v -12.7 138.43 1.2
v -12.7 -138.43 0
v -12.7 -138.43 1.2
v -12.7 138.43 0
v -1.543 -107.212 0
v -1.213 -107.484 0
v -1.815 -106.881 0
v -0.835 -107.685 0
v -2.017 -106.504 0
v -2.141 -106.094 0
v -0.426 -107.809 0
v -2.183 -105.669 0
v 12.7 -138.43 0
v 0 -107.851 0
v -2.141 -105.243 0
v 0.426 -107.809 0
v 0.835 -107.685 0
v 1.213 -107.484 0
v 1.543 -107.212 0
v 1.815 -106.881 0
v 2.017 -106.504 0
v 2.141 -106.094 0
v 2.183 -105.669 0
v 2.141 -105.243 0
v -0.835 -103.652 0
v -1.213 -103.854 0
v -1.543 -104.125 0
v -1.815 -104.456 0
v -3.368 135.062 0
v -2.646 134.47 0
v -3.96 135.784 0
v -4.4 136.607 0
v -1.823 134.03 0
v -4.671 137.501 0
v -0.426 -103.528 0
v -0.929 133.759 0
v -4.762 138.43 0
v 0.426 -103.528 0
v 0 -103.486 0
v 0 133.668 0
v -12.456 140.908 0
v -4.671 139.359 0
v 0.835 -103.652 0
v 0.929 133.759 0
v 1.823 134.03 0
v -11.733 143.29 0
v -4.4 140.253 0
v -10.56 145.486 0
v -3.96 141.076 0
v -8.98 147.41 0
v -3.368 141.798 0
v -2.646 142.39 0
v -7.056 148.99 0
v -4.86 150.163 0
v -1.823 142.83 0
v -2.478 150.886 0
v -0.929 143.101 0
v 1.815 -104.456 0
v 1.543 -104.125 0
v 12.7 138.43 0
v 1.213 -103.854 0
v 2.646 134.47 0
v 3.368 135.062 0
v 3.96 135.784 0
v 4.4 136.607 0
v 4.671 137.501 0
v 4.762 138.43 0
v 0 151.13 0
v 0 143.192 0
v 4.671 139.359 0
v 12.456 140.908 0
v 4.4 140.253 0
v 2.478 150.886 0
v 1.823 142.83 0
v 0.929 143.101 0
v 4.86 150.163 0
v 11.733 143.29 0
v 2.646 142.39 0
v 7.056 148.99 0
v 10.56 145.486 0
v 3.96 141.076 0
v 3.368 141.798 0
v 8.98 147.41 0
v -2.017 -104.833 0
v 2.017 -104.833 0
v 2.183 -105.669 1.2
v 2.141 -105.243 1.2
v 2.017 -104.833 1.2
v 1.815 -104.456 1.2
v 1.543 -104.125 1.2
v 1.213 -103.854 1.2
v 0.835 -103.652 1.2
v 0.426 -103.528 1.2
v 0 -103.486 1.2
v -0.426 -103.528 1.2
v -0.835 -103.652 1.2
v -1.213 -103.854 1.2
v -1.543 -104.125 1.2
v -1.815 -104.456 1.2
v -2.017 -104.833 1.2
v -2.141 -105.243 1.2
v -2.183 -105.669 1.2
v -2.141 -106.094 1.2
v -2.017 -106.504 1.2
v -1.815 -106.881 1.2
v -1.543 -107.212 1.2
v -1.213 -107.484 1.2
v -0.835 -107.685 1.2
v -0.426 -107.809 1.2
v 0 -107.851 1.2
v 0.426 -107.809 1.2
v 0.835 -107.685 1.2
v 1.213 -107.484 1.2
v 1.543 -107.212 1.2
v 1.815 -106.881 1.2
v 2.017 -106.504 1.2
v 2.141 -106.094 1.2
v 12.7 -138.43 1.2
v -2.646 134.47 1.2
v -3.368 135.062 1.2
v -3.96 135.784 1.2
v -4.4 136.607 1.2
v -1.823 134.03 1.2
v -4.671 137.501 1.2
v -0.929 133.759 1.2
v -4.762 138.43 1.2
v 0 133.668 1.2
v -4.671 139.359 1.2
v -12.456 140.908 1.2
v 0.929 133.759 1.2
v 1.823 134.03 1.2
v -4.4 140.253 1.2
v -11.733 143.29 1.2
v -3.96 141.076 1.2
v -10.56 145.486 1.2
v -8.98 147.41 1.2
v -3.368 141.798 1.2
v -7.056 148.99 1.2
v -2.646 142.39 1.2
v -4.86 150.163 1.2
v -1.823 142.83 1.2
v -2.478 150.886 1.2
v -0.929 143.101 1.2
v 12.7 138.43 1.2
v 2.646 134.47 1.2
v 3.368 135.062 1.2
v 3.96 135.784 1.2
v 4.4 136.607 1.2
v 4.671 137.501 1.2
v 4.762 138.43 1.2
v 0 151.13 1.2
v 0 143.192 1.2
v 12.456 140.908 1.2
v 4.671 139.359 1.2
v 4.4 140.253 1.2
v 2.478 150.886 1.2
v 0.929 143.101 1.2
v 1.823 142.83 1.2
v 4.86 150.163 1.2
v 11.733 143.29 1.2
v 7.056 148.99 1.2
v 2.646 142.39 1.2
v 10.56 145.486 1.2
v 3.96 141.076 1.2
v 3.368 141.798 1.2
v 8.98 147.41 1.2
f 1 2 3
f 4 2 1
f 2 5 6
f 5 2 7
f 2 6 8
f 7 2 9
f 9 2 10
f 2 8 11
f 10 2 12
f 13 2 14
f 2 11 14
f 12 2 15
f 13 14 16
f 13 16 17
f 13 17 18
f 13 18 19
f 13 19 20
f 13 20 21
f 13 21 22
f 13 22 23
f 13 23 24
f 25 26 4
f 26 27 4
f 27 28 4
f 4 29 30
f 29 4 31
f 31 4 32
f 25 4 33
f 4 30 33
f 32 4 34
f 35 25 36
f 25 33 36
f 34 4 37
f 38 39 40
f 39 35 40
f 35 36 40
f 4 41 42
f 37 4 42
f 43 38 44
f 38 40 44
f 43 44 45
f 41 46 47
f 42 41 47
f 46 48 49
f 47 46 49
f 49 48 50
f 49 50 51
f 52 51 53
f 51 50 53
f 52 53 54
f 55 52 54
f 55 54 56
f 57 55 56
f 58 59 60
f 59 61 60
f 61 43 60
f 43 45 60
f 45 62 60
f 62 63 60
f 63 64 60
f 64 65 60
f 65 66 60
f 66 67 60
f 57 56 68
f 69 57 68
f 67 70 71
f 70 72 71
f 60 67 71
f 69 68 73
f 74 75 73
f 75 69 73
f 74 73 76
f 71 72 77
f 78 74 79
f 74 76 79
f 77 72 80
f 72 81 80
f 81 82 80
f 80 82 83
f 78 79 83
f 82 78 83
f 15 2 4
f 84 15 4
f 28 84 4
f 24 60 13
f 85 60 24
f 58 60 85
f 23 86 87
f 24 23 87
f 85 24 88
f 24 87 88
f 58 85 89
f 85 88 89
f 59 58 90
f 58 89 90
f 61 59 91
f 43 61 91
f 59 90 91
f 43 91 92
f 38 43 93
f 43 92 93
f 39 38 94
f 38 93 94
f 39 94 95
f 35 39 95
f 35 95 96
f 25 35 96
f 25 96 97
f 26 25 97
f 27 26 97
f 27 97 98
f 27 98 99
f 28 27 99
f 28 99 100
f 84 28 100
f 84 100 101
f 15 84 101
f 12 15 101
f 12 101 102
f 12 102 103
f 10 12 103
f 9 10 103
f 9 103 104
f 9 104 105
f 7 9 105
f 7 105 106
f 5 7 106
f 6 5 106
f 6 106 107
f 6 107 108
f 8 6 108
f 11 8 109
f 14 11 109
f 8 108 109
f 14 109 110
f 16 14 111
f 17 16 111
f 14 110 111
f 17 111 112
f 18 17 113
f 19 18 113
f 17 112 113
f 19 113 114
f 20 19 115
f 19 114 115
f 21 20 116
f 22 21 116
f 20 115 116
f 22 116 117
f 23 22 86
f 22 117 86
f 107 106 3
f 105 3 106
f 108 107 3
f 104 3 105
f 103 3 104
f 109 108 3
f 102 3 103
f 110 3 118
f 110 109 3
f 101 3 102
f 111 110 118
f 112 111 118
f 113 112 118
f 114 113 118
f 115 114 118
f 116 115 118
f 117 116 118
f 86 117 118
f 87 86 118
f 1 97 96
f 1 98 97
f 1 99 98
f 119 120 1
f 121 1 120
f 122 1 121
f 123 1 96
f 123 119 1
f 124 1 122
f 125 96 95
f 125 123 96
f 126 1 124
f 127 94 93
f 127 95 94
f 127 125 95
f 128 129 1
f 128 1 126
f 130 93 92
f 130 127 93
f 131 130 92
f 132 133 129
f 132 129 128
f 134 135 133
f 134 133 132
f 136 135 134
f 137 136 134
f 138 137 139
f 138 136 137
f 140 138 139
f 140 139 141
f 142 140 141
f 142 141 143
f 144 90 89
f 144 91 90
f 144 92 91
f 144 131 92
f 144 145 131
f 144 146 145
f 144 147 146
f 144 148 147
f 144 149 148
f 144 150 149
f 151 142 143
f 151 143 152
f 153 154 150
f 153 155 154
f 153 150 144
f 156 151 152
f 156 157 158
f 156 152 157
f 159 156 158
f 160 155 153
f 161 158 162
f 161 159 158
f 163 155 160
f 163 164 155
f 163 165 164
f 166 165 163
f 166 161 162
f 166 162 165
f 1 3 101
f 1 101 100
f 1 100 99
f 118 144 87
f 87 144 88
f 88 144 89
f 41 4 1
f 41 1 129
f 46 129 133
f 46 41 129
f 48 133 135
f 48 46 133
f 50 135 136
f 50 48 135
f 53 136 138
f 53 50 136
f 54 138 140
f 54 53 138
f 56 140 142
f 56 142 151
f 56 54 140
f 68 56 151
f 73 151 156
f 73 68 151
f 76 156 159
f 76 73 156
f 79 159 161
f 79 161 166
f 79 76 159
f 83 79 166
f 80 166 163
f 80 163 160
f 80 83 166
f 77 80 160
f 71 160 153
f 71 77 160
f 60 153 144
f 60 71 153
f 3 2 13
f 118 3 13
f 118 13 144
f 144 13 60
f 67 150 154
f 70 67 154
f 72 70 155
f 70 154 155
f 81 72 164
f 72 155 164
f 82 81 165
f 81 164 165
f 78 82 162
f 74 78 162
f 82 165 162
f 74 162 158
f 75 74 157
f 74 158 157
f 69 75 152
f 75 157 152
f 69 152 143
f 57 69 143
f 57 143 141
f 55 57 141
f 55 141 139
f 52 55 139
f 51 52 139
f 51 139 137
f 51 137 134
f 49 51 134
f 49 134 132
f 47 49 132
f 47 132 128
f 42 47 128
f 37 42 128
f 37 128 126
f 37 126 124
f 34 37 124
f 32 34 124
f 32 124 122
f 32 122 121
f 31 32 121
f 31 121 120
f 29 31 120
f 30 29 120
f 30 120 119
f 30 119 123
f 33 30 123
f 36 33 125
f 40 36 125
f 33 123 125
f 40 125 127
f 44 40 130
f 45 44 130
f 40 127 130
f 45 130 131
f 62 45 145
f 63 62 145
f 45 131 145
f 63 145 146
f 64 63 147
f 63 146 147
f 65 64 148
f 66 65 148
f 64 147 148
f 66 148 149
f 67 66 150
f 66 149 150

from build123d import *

# Parameters (mm, degrees)
SKETCH1_W           = 25.4
SKETCH1_H           = 276.86
BOSS_EXTRUDE1_DEPTH = 1.2
SKETCH2_R           = 4.7625
CUT_EXTRUDE1_DEPTH  = 2.2
SKETCH3_R           = 2.1827998
CUT_EXTRUDE2_DEPTH  = 2.2


with BuildPart() as part:
    # Sketch1 → Boss-Extrude1 (new body)
    with BuildSketch(Plane.XY):
        Rectangle(SKETCH1_W, SKETCH1_H)
        with BuildLine():
            ThreePointArc((-12.7, 138.43), (0, 151.13), (12.7, 138.43))
            Line((12.7, 138.43), (-12.7, 138.43))
        make_face()
    extrude(amount=BOSS_EXTRUDE1_DEPTH)

    # Sketch2 → Cut-Extrude1 (cut, through all)
    with BuildSketch(Plane.XY.offset(1.2)):
        with Locations((0, 138.43)):
            Circle(SKETCH2_R)
    extrude(amount=-CUT_EXTRUDE1_DEPTH, mode=Mode.SUBTRACT)

    # Sketch3 → Cut-Extrude2 (cut, through all)
    with BuildSketch(Plane.XY.offset(1.2)):
        with Locations((0, -105.668572)):
            Circle(SKETCH3_R)
    extrude(amount=-CUT_EXTRUDE2_DEPTH, mode=Mode.SUBTRACT)


solid = part.part
